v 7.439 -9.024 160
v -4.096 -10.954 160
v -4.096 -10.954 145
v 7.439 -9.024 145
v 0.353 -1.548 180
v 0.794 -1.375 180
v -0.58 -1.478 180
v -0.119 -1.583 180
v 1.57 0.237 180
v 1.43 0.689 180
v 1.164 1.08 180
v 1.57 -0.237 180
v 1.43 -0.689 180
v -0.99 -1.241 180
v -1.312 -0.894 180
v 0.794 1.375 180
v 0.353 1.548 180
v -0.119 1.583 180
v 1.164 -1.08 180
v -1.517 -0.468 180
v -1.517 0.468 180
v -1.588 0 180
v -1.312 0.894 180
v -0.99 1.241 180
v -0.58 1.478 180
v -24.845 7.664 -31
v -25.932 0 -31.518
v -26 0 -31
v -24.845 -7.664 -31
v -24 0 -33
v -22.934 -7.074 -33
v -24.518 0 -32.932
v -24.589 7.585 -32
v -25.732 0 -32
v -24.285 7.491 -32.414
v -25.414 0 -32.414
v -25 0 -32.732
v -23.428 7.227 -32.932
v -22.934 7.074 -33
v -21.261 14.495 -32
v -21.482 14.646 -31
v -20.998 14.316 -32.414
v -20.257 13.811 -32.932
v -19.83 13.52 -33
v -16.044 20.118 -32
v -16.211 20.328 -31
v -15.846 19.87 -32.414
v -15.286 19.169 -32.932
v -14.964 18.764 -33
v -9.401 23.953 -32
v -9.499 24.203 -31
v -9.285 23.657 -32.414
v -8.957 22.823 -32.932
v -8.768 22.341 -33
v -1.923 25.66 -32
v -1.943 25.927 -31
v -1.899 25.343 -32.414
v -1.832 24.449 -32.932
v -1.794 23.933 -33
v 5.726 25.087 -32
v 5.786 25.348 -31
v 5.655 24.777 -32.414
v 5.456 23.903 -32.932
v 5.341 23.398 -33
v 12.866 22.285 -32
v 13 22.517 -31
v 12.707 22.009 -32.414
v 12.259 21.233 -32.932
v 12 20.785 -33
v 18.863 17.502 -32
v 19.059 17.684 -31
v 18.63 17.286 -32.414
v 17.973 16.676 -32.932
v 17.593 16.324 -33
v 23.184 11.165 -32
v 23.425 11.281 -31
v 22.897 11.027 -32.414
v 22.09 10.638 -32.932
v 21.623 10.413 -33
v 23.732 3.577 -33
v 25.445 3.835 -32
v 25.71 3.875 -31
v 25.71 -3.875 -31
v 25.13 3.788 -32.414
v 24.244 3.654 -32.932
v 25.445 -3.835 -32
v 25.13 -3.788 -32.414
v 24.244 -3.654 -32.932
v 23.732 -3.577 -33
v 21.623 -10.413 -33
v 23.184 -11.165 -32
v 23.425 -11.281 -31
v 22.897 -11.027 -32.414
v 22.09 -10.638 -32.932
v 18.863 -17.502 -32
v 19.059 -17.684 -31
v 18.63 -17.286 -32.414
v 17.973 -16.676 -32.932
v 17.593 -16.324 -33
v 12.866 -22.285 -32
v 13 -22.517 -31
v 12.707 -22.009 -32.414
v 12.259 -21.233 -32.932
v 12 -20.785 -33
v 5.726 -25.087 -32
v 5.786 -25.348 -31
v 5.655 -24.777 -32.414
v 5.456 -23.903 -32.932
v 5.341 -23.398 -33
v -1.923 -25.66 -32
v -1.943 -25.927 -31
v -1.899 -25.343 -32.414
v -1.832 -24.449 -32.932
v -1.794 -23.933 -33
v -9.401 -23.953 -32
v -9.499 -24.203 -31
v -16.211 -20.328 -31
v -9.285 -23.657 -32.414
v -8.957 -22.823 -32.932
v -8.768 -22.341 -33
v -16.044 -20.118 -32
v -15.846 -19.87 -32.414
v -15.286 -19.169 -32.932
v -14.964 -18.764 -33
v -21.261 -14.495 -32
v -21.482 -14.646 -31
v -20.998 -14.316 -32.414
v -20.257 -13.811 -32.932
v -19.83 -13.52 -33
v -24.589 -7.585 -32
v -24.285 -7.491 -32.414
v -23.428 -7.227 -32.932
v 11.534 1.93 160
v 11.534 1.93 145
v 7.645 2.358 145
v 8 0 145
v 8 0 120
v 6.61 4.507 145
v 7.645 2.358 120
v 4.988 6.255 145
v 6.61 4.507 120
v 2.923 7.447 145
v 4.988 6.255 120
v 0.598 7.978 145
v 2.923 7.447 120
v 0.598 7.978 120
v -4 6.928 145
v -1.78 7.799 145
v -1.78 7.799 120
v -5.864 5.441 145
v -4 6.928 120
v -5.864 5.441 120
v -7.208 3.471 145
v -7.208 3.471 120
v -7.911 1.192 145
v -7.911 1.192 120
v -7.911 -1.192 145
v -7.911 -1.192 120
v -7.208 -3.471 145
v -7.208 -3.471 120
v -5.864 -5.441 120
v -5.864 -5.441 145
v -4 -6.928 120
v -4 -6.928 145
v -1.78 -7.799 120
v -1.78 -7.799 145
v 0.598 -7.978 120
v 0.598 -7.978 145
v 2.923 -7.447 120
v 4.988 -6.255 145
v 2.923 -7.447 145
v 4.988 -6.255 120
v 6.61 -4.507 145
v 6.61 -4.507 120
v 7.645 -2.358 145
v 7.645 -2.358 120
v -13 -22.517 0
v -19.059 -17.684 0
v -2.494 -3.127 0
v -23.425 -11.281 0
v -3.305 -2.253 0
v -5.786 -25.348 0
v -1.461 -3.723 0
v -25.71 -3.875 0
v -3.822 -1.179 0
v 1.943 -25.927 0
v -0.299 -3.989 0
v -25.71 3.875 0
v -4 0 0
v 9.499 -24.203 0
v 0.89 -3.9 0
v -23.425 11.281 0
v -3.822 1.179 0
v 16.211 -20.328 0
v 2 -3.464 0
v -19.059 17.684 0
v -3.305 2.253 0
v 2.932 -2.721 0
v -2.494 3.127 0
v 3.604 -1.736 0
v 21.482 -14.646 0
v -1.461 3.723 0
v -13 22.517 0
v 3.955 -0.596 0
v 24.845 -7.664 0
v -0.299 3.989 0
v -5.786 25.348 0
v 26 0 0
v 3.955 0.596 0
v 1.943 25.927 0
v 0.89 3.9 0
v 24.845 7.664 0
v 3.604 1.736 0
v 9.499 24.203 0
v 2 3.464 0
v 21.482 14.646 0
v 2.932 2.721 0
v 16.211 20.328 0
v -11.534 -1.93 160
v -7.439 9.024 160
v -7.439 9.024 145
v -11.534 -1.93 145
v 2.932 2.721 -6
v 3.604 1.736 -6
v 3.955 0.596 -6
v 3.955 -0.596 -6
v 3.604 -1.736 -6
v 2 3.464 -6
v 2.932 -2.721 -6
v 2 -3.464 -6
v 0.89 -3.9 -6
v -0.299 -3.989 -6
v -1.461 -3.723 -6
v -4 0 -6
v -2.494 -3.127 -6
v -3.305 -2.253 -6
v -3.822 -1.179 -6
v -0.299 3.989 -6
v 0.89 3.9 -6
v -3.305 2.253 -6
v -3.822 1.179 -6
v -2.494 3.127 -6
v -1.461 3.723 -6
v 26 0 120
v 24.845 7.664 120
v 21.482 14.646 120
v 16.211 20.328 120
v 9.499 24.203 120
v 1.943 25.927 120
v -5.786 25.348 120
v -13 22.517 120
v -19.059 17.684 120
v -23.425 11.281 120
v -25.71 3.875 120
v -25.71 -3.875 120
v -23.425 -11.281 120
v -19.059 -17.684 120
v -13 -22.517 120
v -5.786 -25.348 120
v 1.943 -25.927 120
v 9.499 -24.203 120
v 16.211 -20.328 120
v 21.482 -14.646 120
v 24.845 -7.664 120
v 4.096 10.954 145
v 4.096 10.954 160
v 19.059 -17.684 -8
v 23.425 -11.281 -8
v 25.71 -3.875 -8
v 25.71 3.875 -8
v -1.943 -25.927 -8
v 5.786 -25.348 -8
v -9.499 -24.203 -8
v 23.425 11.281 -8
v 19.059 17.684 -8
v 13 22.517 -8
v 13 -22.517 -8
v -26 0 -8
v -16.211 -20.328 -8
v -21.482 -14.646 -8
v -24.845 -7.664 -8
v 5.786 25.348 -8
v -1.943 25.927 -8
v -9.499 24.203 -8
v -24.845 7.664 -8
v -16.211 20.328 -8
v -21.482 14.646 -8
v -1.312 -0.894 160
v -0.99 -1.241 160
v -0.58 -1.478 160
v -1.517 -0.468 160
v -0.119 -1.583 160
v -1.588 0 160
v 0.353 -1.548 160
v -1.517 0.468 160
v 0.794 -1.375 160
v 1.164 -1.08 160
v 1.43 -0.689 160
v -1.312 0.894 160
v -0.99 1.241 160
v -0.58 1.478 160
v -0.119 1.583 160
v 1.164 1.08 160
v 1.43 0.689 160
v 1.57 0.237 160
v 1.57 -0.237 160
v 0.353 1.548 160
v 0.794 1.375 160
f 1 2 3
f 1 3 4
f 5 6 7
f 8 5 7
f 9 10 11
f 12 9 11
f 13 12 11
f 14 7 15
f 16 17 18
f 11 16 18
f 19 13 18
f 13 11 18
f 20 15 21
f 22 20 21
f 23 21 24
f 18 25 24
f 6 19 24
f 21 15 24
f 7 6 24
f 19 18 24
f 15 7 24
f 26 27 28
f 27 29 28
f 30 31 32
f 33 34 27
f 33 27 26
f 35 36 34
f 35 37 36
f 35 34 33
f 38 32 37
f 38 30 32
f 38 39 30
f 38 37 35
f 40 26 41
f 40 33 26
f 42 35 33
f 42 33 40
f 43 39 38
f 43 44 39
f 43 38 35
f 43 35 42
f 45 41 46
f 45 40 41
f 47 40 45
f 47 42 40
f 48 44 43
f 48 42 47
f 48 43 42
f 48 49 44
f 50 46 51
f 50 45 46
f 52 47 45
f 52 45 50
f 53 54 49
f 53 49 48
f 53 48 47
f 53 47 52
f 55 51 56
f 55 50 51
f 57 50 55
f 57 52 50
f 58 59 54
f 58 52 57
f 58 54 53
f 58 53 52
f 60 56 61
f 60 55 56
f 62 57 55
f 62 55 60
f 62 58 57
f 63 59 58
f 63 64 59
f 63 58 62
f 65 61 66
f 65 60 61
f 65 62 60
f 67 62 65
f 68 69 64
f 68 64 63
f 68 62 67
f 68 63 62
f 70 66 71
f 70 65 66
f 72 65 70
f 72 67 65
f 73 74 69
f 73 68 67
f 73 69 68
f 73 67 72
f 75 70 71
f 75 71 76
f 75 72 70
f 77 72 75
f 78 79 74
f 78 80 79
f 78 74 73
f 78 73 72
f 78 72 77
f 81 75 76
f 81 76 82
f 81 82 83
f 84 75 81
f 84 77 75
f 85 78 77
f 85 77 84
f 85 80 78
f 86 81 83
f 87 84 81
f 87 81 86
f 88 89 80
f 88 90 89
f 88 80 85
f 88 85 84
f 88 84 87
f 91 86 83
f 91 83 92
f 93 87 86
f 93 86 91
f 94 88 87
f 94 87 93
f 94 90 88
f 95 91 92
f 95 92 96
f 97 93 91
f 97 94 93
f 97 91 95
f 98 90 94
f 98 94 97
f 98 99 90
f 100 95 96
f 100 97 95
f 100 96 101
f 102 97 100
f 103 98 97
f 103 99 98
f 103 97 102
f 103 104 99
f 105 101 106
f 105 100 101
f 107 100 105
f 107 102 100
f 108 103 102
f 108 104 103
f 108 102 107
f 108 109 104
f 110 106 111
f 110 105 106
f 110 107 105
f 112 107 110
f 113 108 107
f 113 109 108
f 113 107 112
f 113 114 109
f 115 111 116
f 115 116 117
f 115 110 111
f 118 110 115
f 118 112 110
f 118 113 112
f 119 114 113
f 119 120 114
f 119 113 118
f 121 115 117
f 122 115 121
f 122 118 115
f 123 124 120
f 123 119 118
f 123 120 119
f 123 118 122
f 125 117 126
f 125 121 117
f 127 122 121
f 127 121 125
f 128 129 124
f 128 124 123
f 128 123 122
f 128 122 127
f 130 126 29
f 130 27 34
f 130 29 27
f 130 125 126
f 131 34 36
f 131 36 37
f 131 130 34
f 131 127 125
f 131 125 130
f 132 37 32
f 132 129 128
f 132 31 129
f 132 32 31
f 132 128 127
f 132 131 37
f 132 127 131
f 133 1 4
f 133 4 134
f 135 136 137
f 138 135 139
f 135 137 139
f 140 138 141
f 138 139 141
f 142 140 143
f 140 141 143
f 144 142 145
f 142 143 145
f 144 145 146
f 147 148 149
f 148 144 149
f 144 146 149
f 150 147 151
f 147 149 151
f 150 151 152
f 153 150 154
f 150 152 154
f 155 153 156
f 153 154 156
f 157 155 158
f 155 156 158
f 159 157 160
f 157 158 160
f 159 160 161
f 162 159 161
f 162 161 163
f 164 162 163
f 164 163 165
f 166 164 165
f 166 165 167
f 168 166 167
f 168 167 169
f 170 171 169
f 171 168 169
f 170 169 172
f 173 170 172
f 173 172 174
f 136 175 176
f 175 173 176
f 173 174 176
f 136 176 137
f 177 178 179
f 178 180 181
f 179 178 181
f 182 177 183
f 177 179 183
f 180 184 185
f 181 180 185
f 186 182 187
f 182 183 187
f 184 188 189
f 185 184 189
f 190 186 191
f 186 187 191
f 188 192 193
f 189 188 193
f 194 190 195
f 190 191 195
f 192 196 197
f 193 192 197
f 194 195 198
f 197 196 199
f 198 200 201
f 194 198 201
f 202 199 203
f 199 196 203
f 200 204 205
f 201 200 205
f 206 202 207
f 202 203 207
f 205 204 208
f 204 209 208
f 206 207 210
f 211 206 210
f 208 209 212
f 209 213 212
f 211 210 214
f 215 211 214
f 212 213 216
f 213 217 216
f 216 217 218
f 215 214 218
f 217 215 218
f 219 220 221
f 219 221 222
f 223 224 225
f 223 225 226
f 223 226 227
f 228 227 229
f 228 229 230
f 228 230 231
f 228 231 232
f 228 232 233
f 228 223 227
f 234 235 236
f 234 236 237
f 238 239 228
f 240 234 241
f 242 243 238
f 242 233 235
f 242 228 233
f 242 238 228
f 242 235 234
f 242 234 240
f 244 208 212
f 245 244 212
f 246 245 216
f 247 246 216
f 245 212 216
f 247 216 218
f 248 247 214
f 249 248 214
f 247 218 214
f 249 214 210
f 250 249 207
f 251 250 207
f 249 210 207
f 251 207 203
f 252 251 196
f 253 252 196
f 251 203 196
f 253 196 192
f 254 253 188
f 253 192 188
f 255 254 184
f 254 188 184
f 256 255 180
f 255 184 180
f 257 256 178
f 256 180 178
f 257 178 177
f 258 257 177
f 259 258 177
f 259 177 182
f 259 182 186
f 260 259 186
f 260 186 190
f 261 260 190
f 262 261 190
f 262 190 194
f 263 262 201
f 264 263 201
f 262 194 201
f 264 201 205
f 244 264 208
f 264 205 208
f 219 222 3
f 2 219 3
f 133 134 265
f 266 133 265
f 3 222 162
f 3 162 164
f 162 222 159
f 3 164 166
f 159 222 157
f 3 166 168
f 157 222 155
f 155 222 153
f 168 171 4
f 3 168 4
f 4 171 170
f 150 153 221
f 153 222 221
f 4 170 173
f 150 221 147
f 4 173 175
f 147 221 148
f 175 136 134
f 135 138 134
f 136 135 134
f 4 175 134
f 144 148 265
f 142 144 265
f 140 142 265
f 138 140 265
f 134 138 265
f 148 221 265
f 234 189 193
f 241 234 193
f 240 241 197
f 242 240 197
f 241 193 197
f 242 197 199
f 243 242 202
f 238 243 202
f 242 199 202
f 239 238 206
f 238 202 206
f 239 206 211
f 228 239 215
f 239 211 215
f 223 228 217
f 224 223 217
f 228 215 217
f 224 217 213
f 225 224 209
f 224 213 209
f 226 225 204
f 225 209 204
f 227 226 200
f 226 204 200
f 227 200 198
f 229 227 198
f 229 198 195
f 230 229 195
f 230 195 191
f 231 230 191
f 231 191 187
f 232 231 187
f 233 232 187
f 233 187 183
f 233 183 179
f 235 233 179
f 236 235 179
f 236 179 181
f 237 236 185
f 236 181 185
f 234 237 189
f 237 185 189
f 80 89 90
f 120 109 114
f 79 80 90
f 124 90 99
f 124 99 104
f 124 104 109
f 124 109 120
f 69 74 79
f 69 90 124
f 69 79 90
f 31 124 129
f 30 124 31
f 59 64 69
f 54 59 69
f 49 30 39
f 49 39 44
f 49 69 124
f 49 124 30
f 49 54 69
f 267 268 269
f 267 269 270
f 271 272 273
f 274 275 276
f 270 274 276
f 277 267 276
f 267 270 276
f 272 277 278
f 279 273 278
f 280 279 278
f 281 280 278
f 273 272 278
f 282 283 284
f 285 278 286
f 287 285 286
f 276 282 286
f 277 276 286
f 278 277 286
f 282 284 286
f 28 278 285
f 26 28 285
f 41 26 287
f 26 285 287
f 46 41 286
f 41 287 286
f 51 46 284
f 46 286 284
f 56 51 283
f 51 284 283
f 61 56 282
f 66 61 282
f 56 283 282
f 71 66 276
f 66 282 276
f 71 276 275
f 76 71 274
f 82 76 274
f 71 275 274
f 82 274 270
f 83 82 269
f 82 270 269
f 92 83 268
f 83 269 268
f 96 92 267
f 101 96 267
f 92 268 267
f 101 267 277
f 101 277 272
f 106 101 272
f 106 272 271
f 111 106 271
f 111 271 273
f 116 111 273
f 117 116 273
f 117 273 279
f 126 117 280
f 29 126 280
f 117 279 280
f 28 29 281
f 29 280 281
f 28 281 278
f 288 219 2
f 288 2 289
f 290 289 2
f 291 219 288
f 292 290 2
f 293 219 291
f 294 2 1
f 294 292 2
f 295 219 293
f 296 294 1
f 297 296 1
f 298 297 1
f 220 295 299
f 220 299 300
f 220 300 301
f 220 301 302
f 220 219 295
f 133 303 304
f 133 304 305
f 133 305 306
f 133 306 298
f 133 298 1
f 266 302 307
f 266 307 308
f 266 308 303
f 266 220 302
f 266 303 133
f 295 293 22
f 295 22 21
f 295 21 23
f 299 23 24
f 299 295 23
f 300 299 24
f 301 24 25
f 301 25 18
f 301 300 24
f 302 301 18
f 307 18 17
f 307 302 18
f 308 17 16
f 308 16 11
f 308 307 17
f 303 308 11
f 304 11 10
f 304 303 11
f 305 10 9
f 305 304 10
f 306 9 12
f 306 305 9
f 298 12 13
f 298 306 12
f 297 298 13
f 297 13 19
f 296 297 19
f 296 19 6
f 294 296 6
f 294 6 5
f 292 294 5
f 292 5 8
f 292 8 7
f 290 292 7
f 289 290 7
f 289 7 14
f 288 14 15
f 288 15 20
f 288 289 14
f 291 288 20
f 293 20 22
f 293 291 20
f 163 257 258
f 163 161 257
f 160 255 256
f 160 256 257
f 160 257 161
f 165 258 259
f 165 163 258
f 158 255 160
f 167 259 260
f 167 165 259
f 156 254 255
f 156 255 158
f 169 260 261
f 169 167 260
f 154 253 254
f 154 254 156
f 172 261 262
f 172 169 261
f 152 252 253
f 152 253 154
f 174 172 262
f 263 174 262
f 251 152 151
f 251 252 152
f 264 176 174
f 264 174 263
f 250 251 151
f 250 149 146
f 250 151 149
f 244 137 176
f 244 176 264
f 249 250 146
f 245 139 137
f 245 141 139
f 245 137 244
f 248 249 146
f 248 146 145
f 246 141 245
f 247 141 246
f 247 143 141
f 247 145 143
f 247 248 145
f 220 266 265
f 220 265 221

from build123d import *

# Parameters (mm, degrees)
SKETCH_1_R      = 26
EXTRUDE_1_DEPTH = 120
EXTRUDE_START   = 8
SKETCH_2_R      = 26
EXTRUDE_2_DEPTH = 25
FILLET_1_R      = 2
SKETCH_3_R      = 8
EXTRUDE_3_DEPTH = 40
EXTRUDE_4_DEPTH = 15
SKETCH_5_R      = 1.5875
EXTRUDE_5_DEPTH = 20
SKETCH_7_R      = 4
EXTRUDE_6_DEPTH = 6


with BuildPart() as part:
    # Эскиз1 → Бобышка-Вытянуть1 (new body)
    with BuildSketch(Plane.XY):
        Circle(SKETCH_1_R)
    extrude(amount=EXTRUDE_1_DEPTH)

    # Эскиз3 → Бобышка-Вытянуть3 (add)
    with BuildSketch(Plane.XY.offset(120)):
        Circle(SKETCH_3_R)
    extrude(amount=EXTRUDE_3_DEPTH)

    # Эскиз4 → Бобышка-Вытянуть4 (add)
    with BuildSketch(Plane.XY.offset(160)):
        Polygon((11.534146379, 1.930154149), (4.095510664, 10.95394085), (-7.438635716, 9.023786701), (-11.534146379, -1.930154149), (-4.095510664, -10.95394085), (7.438635716, -9.023786701), align=None)
    extrude(amount=-EXTRUDE_4_DEPTH)

    # Эскиз5 → Бобышка-Вытянуть5 (add)
    with BuildSketch(Plane(origin=(0, 0, 160), x_dir=(-1, 0, 0), z_dir=(0, 0, -1))):
        Circle(SKETCH_5_R)
    extrude(amount=-EXTRUDE_5_DEPTH)

    # Эскиз7 → Бобышка-Вытянуть6 (add)
    with BuildSketch(Plane(origin=(0, 0, 0), x_dir=(-1, 0, 0), z_dir=(0, 0, -1))):
        Circle(SKETCH_7_R)
    extrude(amount=EXTRUDE_6_DEPTH)


with BuildPart() as body_2:
    # Эскиз2 → Бобышка-Вытянуть2 (new body)
    with BuildSketch(Plane(origin=(0, 0, 0), x_dir=(-1, 0, 0), z_dir=(0, 0, -1)).offset(EXTRUDE_START)):
        Circle(SKETCH_2_R)
    extrude(amount=EXTRUDE_2_DEPTH)

    # Скругление1
    fillet_1_edges = [body_2.edges().sort_by_distance(p)[0] for p in [
        (26, 0, -33),
    ]]
    fillet(fillet_1_edges, radius=FILLET_1_R)


solid = Compound([part.part, body_2.part])
